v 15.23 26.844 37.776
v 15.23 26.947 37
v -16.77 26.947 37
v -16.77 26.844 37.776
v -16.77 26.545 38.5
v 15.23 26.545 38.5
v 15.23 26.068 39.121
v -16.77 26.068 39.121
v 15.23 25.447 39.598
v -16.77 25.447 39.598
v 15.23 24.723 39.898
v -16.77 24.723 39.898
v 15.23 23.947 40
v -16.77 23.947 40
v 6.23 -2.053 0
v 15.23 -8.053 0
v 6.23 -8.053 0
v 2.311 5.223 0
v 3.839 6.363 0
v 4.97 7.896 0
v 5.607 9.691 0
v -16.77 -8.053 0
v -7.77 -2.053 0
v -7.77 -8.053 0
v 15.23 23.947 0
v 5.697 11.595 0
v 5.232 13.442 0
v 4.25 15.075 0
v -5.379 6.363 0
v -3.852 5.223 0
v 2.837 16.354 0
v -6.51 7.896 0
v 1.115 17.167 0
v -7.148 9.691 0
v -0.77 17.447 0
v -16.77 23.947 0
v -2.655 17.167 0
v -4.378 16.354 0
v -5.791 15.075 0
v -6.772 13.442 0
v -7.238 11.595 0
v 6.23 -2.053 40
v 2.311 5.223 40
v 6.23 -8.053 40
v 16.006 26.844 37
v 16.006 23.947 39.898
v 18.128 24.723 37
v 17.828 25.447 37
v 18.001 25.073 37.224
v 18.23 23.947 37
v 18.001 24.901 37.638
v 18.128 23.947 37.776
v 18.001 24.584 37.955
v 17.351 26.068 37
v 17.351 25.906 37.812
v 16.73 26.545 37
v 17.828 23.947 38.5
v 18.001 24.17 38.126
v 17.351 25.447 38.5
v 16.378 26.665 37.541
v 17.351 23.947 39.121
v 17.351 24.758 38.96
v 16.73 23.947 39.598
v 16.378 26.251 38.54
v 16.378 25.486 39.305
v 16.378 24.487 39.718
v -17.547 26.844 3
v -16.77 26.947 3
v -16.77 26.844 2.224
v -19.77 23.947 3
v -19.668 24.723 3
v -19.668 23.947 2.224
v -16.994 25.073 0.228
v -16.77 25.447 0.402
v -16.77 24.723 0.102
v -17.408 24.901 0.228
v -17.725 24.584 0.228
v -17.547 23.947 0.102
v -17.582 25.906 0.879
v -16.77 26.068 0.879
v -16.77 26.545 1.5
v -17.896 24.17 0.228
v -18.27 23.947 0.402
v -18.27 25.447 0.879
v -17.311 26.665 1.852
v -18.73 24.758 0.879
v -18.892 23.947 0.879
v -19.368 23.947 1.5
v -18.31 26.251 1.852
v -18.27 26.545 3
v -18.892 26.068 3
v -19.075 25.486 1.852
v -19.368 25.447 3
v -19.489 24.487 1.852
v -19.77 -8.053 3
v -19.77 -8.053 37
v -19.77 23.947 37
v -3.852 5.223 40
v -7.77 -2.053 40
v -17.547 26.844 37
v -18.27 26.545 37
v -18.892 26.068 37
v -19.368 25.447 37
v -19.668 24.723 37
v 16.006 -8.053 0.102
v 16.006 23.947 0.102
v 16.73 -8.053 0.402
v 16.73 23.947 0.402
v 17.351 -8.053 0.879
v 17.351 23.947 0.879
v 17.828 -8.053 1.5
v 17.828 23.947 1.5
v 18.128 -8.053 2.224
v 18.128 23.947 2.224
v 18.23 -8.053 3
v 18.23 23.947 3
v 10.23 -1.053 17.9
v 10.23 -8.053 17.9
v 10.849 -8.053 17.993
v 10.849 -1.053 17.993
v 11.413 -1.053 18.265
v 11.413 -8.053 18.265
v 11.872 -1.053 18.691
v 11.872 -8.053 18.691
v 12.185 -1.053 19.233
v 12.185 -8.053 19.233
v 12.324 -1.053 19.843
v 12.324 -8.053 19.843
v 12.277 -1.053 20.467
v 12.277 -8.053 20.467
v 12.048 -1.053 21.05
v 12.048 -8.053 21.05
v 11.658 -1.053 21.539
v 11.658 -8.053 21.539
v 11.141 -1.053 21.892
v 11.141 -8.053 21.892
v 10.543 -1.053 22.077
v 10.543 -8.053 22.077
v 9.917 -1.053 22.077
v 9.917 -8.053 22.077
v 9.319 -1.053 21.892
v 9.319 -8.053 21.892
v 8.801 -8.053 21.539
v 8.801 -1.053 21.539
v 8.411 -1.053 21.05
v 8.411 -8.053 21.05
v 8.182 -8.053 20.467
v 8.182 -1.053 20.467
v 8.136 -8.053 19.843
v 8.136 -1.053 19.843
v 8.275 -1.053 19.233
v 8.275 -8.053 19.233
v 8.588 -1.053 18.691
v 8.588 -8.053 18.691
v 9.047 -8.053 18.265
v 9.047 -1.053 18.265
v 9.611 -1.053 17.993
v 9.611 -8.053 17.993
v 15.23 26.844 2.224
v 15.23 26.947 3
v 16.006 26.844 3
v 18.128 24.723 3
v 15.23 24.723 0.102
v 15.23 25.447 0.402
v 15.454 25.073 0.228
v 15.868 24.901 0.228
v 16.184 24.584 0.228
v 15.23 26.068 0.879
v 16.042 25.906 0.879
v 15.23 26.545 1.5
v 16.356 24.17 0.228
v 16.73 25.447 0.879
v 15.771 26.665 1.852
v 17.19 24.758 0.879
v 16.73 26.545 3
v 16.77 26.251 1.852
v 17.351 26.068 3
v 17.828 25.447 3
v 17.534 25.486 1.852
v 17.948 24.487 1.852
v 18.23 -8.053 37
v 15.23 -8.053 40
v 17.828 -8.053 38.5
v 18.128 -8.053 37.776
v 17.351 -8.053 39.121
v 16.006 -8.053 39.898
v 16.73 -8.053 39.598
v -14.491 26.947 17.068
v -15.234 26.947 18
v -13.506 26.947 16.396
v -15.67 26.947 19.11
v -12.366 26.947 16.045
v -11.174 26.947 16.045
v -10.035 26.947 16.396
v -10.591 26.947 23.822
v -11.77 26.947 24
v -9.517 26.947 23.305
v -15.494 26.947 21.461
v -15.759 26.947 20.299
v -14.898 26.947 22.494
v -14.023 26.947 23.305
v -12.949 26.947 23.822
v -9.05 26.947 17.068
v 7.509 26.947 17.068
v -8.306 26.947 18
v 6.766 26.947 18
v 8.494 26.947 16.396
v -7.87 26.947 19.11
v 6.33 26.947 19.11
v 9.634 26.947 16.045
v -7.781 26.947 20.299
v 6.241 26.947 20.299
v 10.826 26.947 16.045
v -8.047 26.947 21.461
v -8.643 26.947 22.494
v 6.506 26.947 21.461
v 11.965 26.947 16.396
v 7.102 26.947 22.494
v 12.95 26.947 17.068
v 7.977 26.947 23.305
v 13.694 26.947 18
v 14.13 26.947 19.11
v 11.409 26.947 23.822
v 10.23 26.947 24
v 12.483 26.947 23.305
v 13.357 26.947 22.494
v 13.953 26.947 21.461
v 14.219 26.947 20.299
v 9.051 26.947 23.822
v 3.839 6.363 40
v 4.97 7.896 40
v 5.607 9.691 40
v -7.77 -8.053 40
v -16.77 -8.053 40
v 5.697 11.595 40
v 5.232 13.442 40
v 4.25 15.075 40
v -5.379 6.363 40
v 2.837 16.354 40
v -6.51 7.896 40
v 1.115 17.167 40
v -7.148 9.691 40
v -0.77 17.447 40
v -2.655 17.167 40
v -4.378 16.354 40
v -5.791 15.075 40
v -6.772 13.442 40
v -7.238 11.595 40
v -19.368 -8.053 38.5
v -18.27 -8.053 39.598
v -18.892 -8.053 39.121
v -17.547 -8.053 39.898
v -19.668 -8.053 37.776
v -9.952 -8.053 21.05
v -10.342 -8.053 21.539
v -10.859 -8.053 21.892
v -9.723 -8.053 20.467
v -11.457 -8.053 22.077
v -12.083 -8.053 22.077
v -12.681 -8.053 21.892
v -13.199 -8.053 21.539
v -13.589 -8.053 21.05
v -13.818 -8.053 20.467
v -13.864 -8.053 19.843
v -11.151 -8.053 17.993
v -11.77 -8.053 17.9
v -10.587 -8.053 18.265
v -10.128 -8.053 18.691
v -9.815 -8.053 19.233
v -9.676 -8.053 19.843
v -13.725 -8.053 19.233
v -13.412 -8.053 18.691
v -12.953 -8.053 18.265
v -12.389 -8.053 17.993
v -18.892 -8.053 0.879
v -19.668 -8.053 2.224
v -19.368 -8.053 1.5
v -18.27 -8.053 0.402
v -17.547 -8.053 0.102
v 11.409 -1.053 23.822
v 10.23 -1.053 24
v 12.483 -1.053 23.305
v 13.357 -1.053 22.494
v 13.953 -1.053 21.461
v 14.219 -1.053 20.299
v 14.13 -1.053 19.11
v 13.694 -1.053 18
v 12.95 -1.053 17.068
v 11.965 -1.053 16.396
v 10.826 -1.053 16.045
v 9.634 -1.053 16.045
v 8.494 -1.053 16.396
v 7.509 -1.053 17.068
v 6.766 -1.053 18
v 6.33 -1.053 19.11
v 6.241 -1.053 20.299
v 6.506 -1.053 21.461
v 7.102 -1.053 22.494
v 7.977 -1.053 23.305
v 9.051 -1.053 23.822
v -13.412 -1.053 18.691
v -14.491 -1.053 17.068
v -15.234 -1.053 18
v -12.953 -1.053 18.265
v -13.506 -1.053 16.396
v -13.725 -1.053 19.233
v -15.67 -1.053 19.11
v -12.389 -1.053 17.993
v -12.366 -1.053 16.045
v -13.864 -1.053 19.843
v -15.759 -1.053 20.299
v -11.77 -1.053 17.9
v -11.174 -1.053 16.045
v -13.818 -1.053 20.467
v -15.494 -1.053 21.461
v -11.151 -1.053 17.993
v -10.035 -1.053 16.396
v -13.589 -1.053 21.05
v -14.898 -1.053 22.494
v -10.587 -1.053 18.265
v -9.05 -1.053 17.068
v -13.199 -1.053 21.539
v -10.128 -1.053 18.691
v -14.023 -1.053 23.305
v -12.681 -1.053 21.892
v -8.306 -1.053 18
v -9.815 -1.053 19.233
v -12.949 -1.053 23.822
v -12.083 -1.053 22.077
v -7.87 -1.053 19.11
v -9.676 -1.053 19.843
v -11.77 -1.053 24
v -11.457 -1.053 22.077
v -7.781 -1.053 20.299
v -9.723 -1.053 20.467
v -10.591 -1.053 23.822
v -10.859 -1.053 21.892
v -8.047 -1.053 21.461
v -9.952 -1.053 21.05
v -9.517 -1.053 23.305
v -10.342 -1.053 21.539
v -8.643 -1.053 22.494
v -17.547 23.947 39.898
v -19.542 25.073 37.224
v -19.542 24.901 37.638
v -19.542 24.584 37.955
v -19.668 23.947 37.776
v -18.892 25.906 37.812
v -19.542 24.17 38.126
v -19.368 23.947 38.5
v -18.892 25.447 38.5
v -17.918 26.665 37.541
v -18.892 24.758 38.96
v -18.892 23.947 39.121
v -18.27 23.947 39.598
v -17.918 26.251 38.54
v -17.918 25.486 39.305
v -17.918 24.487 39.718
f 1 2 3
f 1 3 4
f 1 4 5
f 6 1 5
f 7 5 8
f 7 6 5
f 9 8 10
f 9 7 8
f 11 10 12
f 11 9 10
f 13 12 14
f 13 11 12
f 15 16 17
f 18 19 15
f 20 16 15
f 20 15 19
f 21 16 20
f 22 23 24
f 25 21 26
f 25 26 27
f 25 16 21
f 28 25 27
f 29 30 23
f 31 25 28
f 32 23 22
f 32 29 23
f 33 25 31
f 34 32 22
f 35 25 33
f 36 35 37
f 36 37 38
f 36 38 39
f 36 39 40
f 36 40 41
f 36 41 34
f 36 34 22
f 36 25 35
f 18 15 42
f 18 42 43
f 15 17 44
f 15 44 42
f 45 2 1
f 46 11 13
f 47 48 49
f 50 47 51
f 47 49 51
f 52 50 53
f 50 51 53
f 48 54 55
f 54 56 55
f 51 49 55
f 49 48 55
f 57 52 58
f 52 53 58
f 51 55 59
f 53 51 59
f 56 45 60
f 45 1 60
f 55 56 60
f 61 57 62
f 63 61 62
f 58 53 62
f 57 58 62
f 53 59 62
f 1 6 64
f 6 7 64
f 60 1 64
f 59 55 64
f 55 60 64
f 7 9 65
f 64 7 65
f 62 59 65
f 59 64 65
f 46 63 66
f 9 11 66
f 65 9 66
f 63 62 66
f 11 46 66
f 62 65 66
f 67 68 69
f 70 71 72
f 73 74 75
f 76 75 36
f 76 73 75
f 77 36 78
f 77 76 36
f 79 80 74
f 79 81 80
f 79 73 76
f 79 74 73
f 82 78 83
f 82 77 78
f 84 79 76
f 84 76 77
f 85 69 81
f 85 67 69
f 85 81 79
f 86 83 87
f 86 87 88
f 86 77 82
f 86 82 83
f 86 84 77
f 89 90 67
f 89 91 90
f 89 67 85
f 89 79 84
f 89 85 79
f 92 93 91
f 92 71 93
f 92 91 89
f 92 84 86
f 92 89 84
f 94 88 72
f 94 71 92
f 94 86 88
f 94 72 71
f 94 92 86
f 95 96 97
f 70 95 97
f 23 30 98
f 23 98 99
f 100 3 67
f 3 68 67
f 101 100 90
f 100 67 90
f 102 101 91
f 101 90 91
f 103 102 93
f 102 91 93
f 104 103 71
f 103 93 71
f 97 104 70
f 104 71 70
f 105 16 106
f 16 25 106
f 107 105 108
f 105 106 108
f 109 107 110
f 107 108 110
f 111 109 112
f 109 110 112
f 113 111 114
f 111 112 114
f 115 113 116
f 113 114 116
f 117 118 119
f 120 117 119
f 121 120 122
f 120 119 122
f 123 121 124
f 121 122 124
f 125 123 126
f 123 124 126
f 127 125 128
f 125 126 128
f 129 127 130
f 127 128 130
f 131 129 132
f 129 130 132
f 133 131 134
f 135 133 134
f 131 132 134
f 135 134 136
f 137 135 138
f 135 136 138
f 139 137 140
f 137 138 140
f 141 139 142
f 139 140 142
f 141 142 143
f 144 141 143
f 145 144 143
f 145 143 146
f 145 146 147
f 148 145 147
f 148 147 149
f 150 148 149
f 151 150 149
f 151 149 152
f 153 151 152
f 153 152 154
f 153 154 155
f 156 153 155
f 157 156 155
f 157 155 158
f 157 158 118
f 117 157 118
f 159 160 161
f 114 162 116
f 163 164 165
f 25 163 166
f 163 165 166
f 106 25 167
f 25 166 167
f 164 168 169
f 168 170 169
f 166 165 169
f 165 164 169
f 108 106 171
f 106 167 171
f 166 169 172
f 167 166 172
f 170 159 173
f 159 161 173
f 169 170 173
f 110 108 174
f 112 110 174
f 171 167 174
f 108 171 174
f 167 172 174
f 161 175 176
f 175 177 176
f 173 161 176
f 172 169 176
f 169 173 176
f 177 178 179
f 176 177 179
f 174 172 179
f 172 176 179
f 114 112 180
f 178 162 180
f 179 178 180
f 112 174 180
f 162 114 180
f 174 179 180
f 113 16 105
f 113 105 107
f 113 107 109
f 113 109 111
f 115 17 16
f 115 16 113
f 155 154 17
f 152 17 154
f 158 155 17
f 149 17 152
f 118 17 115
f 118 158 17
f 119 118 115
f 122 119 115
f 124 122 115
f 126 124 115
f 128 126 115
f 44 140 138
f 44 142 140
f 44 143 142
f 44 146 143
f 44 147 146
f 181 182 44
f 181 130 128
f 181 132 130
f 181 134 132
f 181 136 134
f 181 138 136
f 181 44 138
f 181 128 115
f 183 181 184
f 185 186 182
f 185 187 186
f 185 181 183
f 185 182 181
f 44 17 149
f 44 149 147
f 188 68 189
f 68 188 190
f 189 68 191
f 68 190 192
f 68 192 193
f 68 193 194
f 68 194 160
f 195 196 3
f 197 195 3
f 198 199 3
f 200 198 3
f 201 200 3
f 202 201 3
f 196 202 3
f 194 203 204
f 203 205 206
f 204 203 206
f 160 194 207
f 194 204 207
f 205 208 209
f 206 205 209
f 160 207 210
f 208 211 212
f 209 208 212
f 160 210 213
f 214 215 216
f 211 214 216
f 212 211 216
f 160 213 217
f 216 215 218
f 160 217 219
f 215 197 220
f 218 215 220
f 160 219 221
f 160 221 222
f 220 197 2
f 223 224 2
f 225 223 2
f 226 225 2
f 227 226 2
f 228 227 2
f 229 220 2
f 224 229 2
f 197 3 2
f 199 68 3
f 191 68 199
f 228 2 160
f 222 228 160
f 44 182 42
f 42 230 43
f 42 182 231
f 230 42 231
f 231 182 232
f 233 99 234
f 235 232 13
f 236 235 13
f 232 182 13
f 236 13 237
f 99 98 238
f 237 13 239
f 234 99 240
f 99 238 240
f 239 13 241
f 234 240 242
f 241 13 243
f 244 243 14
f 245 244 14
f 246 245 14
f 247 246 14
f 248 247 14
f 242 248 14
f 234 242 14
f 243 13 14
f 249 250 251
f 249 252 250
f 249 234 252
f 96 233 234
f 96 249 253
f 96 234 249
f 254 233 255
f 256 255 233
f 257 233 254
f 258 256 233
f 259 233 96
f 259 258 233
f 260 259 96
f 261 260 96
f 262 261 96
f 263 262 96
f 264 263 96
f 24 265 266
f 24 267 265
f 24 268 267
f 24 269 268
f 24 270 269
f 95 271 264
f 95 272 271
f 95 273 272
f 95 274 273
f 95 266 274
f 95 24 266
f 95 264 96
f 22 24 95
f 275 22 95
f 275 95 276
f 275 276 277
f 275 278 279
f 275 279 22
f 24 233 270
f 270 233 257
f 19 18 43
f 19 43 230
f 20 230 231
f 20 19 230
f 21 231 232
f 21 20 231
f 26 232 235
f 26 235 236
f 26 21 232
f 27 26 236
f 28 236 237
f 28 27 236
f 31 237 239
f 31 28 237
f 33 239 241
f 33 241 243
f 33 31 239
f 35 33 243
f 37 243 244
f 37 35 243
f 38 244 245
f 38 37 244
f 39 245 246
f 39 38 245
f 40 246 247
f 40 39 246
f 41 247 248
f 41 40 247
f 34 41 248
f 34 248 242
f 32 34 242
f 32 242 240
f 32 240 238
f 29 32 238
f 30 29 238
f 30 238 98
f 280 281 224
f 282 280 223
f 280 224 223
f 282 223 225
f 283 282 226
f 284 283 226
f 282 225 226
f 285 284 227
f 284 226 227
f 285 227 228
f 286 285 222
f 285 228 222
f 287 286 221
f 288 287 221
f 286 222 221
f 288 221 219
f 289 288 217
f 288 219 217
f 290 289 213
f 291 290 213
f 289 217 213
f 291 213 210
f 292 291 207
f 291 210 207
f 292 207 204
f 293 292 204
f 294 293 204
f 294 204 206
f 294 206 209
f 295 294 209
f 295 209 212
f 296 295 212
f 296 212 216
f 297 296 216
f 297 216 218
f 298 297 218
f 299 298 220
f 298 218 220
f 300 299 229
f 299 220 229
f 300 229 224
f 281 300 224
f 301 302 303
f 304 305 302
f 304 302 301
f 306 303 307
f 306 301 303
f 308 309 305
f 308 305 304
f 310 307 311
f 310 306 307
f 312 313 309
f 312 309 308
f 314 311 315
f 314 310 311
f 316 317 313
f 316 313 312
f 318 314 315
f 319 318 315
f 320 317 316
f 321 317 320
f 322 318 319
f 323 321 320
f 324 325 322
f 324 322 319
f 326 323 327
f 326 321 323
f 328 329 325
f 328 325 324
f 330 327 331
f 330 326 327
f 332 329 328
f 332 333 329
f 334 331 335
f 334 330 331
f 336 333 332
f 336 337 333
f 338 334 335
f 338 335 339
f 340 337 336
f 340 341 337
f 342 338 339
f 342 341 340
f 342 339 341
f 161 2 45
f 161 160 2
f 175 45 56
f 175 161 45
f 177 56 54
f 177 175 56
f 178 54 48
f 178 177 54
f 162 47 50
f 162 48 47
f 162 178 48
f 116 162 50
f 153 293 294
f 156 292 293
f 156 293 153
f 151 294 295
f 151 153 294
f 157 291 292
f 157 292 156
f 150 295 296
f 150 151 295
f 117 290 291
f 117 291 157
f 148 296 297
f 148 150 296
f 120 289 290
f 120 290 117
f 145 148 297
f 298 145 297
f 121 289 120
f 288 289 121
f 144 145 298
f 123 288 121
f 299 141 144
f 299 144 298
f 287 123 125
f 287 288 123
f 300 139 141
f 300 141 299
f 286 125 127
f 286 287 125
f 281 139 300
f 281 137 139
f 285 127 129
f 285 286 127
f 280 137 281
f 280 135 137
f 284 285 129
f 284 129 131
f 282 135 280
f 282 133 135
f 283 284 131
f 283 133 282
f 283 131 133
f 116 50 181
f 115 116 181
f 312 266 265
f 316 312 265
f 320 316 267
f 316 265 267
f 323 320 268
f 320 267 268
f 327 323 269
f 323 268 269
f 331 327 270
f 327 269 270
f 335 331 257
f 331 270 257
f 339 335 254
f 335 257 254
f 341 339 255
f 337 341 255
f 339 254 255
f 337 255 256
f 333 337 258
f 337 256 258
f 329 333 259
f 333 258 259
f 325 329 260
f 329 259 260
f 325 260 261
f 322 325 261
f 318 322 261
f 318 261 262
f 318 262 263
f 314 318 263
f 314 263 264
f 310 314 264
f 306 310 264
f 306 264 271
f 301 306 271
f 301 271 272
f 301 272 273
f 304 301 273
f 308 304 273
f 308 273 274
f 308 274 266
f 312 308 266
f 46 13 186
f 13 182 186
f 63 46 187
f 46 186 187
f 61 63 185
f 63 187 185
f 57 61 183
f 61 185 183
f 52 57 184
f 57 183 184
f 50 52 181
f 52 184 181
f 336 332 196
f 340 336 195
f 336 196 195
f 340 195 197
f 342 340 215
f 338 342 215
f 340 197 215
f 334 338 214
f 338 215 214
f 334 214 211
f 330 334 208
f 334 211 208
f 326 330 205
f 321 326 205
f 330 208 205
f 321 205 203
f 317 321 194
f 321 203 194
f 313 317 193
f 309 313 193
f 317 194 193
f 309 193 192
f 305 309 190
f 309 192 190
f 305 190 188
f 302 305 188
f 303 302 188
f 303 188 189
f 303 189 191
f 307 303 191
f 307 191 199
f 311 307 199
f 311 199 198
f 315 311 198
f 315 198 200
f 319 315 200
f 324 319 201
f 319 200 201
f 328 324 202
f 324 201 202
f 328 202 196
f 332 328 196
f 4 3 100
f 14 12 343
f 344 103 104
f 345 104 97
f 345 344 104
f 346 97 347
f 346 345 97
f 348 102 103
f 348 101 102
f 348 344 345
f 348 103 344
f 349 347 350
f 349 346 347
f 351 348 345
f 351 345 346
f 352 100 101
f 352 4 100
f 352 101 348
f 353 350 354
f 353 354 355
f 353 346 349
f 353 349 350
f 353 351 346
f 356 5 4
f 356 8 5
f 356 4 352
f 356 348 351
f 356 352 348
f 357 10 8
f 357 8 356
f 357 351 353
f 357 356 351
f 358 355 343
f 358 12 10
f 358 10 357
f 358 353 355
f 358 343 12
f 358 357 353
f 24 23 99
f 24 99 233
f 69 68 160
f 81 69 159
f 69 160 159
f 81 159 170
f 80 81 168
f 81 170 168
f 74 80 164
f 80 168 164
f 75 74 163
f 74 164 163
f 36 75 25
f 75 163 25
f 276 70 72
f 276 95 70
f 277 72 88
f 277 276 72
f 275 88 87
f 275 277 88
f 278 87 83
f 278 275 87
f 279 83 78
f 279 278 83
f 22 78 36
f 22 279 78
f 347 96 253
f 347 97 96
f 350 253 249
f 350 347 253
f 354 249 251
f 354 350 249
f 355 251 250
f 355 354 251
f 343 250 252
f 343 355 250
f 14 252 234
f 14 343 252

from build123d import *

# Parameters (mm, degrees)
BOSS_EXTRUDE1_DEPTH = 40
SHELL1_T            = 4
SKETCH2_W           = 38
SKETCH2_H           = 8
CUT_EXTRUDE1_DEPTH  = 50.505693367
BOSS_EXTRUDE2_DEPTH = 40
SKETCH4_R           = 2.1
CUT_EXTRUDE2_DEPTH  = 57.708559772
SKETCH5_R           = 4
CUT_EXTRUDE4_DEPTH  = 28
LPATTERN1_COUNT     = 2
LPATTERN1_PITCH     = 22
FILLET1_R           = 3


with BuildPart() as part:
    # Sketch1 → Boss-Extrude1 (new body)
    with BuildSketch(Plane.XY):
        with BuildLine():
            Line((-15.770198569, -12.053486897), (14.229801431, -12.053486897))
            Line((14.229801431, -12.053486897), (14.229801431, -8.053486897))
            Line((14.229801431, -8.053486897), (6.229801431, -8.053486897))
            Line((6.229801431, -8.053486897), (6.229801431, -2.053486897))
            Line((6.229801431, -2.053486897), (2.31145028, 5.223450953))
            ThreePointArc((2.31145028, 5.223450953), (-0.770198569, 17.446513103), (-3.851847419, 5.223450953))
            Line((-3.851847419, 5.223450953), (-7.770198569, -2.053486897))
            Line((-7.770198569, -2.053486897), (-7.770198569, -8.053486897))
            Line((-7.770198569, -8.053486897), (-15.770198569, -8.053486897))
            Line((-15.770198569, -8.053486897), (-15.770198569, -12.053486897))
        make_face()
    extrude(amount=BOSS_EXTRUDE1_DEPTH)

    # Shell1
    shell1_openings = [part.faces().sort_by_distance(p)[0] for p in [
        (-0.770198569, -0.27560318, 0),
        (-0.770198569, -0.27560318, 40),
    ]]
    offset(amount=SHELL1_T, openings=shell1_openings, kind=Kind.INTERSECTION)

    # Sketch2 → Cut-Extrude1 (cut, through all)
    with BuildSketch(Plane.XY.offset(40)):
        with Locations((-0.770198569, -12.053486897)):
            Rectangle(SKETCH2_W, SKETCH2_H)
    extrude(amount=-CUT_EXTRUDE1_DEPTH, mode=Mode.SUBTRACT)

    # Sketch3 → Boss-Extrude2 (add, through all)
    with BuildSketch(Plane.XY.offset(40)):
        Polygon((-19.770198569, 26.946513103), (18.229801431, 26.946513103), (18.229801431, -8.053486897), (6.229801431, -8.053486897), (6.229801431, 17.511933237), (-7.770198569, 17.511933237), (-7.770198569, -8.053486897), (-19.770198569, -8.053486897), align=None)
    extrude(amount=-BOSS_EXTRUDE2_DEPTH)

    # Sketch4 → Cut-Extrude2 (cut, through all)
    with BuildSketch(Plane.XZ.offset(8.053486897)):
        with Locations(Location((-11.770198569, 20, 0), (0, 0, 270))):
            Circle(SKETCH4_R)
    cut_extrude2 = extrude(amount=-CUT_EXTRUDE2_DEPTH, mode=Mode.SUBTRACT)

    # Sketch5 → Cut-Extrude4 (cut)
    with BuildSketch(Plane(origin=(0, 26.946513103, 0), x_dir=(1, 0, 0), z_dir=(0, 1, 0))):
        with Locations(Location((-11.770198569, -20, 0), (0, 0, 270))):
            Circle(SKETCH5_R)
    cut_extrude4 = extrude(amount=-CUT_EXTRUDE4_DEPTH, mode=Mode.SUBTRACT)

    # LPattern1: Cut-Extrude2, Cut-Extrude4 ×2
    with Locations(*[(i * LPATTERN1_PITCH, 0, 0) for i in range(1, LPATTERN1_COUNT)]):
        add(cut_extrude2, mode=Mode.SUBTRACT)
        add(cut_extrude4, mode=Mode.SUBTRACT)

    # Fillet1
    fillet1_edges = [part.edges().sort_by_distance(p)[0] for p in [
        (-0.770198569, 26.946513103, 40),
        (-19.770198569, 26.946513103, 20),
        (18.229801431, 26.946513103, 20),
        (-0.770198569, 26.946513103, 0),
        (-19.770198569, 9.446513103, 0),
        (-19.770198569, 9.446513103, 40),
        (18.229801431, 9.446513103, 0),
        (18.229801431, 9.446513103, 40),
    ]]
    fillet(fillet1_edges, radius=FILLET1_R)


solid = part.part
